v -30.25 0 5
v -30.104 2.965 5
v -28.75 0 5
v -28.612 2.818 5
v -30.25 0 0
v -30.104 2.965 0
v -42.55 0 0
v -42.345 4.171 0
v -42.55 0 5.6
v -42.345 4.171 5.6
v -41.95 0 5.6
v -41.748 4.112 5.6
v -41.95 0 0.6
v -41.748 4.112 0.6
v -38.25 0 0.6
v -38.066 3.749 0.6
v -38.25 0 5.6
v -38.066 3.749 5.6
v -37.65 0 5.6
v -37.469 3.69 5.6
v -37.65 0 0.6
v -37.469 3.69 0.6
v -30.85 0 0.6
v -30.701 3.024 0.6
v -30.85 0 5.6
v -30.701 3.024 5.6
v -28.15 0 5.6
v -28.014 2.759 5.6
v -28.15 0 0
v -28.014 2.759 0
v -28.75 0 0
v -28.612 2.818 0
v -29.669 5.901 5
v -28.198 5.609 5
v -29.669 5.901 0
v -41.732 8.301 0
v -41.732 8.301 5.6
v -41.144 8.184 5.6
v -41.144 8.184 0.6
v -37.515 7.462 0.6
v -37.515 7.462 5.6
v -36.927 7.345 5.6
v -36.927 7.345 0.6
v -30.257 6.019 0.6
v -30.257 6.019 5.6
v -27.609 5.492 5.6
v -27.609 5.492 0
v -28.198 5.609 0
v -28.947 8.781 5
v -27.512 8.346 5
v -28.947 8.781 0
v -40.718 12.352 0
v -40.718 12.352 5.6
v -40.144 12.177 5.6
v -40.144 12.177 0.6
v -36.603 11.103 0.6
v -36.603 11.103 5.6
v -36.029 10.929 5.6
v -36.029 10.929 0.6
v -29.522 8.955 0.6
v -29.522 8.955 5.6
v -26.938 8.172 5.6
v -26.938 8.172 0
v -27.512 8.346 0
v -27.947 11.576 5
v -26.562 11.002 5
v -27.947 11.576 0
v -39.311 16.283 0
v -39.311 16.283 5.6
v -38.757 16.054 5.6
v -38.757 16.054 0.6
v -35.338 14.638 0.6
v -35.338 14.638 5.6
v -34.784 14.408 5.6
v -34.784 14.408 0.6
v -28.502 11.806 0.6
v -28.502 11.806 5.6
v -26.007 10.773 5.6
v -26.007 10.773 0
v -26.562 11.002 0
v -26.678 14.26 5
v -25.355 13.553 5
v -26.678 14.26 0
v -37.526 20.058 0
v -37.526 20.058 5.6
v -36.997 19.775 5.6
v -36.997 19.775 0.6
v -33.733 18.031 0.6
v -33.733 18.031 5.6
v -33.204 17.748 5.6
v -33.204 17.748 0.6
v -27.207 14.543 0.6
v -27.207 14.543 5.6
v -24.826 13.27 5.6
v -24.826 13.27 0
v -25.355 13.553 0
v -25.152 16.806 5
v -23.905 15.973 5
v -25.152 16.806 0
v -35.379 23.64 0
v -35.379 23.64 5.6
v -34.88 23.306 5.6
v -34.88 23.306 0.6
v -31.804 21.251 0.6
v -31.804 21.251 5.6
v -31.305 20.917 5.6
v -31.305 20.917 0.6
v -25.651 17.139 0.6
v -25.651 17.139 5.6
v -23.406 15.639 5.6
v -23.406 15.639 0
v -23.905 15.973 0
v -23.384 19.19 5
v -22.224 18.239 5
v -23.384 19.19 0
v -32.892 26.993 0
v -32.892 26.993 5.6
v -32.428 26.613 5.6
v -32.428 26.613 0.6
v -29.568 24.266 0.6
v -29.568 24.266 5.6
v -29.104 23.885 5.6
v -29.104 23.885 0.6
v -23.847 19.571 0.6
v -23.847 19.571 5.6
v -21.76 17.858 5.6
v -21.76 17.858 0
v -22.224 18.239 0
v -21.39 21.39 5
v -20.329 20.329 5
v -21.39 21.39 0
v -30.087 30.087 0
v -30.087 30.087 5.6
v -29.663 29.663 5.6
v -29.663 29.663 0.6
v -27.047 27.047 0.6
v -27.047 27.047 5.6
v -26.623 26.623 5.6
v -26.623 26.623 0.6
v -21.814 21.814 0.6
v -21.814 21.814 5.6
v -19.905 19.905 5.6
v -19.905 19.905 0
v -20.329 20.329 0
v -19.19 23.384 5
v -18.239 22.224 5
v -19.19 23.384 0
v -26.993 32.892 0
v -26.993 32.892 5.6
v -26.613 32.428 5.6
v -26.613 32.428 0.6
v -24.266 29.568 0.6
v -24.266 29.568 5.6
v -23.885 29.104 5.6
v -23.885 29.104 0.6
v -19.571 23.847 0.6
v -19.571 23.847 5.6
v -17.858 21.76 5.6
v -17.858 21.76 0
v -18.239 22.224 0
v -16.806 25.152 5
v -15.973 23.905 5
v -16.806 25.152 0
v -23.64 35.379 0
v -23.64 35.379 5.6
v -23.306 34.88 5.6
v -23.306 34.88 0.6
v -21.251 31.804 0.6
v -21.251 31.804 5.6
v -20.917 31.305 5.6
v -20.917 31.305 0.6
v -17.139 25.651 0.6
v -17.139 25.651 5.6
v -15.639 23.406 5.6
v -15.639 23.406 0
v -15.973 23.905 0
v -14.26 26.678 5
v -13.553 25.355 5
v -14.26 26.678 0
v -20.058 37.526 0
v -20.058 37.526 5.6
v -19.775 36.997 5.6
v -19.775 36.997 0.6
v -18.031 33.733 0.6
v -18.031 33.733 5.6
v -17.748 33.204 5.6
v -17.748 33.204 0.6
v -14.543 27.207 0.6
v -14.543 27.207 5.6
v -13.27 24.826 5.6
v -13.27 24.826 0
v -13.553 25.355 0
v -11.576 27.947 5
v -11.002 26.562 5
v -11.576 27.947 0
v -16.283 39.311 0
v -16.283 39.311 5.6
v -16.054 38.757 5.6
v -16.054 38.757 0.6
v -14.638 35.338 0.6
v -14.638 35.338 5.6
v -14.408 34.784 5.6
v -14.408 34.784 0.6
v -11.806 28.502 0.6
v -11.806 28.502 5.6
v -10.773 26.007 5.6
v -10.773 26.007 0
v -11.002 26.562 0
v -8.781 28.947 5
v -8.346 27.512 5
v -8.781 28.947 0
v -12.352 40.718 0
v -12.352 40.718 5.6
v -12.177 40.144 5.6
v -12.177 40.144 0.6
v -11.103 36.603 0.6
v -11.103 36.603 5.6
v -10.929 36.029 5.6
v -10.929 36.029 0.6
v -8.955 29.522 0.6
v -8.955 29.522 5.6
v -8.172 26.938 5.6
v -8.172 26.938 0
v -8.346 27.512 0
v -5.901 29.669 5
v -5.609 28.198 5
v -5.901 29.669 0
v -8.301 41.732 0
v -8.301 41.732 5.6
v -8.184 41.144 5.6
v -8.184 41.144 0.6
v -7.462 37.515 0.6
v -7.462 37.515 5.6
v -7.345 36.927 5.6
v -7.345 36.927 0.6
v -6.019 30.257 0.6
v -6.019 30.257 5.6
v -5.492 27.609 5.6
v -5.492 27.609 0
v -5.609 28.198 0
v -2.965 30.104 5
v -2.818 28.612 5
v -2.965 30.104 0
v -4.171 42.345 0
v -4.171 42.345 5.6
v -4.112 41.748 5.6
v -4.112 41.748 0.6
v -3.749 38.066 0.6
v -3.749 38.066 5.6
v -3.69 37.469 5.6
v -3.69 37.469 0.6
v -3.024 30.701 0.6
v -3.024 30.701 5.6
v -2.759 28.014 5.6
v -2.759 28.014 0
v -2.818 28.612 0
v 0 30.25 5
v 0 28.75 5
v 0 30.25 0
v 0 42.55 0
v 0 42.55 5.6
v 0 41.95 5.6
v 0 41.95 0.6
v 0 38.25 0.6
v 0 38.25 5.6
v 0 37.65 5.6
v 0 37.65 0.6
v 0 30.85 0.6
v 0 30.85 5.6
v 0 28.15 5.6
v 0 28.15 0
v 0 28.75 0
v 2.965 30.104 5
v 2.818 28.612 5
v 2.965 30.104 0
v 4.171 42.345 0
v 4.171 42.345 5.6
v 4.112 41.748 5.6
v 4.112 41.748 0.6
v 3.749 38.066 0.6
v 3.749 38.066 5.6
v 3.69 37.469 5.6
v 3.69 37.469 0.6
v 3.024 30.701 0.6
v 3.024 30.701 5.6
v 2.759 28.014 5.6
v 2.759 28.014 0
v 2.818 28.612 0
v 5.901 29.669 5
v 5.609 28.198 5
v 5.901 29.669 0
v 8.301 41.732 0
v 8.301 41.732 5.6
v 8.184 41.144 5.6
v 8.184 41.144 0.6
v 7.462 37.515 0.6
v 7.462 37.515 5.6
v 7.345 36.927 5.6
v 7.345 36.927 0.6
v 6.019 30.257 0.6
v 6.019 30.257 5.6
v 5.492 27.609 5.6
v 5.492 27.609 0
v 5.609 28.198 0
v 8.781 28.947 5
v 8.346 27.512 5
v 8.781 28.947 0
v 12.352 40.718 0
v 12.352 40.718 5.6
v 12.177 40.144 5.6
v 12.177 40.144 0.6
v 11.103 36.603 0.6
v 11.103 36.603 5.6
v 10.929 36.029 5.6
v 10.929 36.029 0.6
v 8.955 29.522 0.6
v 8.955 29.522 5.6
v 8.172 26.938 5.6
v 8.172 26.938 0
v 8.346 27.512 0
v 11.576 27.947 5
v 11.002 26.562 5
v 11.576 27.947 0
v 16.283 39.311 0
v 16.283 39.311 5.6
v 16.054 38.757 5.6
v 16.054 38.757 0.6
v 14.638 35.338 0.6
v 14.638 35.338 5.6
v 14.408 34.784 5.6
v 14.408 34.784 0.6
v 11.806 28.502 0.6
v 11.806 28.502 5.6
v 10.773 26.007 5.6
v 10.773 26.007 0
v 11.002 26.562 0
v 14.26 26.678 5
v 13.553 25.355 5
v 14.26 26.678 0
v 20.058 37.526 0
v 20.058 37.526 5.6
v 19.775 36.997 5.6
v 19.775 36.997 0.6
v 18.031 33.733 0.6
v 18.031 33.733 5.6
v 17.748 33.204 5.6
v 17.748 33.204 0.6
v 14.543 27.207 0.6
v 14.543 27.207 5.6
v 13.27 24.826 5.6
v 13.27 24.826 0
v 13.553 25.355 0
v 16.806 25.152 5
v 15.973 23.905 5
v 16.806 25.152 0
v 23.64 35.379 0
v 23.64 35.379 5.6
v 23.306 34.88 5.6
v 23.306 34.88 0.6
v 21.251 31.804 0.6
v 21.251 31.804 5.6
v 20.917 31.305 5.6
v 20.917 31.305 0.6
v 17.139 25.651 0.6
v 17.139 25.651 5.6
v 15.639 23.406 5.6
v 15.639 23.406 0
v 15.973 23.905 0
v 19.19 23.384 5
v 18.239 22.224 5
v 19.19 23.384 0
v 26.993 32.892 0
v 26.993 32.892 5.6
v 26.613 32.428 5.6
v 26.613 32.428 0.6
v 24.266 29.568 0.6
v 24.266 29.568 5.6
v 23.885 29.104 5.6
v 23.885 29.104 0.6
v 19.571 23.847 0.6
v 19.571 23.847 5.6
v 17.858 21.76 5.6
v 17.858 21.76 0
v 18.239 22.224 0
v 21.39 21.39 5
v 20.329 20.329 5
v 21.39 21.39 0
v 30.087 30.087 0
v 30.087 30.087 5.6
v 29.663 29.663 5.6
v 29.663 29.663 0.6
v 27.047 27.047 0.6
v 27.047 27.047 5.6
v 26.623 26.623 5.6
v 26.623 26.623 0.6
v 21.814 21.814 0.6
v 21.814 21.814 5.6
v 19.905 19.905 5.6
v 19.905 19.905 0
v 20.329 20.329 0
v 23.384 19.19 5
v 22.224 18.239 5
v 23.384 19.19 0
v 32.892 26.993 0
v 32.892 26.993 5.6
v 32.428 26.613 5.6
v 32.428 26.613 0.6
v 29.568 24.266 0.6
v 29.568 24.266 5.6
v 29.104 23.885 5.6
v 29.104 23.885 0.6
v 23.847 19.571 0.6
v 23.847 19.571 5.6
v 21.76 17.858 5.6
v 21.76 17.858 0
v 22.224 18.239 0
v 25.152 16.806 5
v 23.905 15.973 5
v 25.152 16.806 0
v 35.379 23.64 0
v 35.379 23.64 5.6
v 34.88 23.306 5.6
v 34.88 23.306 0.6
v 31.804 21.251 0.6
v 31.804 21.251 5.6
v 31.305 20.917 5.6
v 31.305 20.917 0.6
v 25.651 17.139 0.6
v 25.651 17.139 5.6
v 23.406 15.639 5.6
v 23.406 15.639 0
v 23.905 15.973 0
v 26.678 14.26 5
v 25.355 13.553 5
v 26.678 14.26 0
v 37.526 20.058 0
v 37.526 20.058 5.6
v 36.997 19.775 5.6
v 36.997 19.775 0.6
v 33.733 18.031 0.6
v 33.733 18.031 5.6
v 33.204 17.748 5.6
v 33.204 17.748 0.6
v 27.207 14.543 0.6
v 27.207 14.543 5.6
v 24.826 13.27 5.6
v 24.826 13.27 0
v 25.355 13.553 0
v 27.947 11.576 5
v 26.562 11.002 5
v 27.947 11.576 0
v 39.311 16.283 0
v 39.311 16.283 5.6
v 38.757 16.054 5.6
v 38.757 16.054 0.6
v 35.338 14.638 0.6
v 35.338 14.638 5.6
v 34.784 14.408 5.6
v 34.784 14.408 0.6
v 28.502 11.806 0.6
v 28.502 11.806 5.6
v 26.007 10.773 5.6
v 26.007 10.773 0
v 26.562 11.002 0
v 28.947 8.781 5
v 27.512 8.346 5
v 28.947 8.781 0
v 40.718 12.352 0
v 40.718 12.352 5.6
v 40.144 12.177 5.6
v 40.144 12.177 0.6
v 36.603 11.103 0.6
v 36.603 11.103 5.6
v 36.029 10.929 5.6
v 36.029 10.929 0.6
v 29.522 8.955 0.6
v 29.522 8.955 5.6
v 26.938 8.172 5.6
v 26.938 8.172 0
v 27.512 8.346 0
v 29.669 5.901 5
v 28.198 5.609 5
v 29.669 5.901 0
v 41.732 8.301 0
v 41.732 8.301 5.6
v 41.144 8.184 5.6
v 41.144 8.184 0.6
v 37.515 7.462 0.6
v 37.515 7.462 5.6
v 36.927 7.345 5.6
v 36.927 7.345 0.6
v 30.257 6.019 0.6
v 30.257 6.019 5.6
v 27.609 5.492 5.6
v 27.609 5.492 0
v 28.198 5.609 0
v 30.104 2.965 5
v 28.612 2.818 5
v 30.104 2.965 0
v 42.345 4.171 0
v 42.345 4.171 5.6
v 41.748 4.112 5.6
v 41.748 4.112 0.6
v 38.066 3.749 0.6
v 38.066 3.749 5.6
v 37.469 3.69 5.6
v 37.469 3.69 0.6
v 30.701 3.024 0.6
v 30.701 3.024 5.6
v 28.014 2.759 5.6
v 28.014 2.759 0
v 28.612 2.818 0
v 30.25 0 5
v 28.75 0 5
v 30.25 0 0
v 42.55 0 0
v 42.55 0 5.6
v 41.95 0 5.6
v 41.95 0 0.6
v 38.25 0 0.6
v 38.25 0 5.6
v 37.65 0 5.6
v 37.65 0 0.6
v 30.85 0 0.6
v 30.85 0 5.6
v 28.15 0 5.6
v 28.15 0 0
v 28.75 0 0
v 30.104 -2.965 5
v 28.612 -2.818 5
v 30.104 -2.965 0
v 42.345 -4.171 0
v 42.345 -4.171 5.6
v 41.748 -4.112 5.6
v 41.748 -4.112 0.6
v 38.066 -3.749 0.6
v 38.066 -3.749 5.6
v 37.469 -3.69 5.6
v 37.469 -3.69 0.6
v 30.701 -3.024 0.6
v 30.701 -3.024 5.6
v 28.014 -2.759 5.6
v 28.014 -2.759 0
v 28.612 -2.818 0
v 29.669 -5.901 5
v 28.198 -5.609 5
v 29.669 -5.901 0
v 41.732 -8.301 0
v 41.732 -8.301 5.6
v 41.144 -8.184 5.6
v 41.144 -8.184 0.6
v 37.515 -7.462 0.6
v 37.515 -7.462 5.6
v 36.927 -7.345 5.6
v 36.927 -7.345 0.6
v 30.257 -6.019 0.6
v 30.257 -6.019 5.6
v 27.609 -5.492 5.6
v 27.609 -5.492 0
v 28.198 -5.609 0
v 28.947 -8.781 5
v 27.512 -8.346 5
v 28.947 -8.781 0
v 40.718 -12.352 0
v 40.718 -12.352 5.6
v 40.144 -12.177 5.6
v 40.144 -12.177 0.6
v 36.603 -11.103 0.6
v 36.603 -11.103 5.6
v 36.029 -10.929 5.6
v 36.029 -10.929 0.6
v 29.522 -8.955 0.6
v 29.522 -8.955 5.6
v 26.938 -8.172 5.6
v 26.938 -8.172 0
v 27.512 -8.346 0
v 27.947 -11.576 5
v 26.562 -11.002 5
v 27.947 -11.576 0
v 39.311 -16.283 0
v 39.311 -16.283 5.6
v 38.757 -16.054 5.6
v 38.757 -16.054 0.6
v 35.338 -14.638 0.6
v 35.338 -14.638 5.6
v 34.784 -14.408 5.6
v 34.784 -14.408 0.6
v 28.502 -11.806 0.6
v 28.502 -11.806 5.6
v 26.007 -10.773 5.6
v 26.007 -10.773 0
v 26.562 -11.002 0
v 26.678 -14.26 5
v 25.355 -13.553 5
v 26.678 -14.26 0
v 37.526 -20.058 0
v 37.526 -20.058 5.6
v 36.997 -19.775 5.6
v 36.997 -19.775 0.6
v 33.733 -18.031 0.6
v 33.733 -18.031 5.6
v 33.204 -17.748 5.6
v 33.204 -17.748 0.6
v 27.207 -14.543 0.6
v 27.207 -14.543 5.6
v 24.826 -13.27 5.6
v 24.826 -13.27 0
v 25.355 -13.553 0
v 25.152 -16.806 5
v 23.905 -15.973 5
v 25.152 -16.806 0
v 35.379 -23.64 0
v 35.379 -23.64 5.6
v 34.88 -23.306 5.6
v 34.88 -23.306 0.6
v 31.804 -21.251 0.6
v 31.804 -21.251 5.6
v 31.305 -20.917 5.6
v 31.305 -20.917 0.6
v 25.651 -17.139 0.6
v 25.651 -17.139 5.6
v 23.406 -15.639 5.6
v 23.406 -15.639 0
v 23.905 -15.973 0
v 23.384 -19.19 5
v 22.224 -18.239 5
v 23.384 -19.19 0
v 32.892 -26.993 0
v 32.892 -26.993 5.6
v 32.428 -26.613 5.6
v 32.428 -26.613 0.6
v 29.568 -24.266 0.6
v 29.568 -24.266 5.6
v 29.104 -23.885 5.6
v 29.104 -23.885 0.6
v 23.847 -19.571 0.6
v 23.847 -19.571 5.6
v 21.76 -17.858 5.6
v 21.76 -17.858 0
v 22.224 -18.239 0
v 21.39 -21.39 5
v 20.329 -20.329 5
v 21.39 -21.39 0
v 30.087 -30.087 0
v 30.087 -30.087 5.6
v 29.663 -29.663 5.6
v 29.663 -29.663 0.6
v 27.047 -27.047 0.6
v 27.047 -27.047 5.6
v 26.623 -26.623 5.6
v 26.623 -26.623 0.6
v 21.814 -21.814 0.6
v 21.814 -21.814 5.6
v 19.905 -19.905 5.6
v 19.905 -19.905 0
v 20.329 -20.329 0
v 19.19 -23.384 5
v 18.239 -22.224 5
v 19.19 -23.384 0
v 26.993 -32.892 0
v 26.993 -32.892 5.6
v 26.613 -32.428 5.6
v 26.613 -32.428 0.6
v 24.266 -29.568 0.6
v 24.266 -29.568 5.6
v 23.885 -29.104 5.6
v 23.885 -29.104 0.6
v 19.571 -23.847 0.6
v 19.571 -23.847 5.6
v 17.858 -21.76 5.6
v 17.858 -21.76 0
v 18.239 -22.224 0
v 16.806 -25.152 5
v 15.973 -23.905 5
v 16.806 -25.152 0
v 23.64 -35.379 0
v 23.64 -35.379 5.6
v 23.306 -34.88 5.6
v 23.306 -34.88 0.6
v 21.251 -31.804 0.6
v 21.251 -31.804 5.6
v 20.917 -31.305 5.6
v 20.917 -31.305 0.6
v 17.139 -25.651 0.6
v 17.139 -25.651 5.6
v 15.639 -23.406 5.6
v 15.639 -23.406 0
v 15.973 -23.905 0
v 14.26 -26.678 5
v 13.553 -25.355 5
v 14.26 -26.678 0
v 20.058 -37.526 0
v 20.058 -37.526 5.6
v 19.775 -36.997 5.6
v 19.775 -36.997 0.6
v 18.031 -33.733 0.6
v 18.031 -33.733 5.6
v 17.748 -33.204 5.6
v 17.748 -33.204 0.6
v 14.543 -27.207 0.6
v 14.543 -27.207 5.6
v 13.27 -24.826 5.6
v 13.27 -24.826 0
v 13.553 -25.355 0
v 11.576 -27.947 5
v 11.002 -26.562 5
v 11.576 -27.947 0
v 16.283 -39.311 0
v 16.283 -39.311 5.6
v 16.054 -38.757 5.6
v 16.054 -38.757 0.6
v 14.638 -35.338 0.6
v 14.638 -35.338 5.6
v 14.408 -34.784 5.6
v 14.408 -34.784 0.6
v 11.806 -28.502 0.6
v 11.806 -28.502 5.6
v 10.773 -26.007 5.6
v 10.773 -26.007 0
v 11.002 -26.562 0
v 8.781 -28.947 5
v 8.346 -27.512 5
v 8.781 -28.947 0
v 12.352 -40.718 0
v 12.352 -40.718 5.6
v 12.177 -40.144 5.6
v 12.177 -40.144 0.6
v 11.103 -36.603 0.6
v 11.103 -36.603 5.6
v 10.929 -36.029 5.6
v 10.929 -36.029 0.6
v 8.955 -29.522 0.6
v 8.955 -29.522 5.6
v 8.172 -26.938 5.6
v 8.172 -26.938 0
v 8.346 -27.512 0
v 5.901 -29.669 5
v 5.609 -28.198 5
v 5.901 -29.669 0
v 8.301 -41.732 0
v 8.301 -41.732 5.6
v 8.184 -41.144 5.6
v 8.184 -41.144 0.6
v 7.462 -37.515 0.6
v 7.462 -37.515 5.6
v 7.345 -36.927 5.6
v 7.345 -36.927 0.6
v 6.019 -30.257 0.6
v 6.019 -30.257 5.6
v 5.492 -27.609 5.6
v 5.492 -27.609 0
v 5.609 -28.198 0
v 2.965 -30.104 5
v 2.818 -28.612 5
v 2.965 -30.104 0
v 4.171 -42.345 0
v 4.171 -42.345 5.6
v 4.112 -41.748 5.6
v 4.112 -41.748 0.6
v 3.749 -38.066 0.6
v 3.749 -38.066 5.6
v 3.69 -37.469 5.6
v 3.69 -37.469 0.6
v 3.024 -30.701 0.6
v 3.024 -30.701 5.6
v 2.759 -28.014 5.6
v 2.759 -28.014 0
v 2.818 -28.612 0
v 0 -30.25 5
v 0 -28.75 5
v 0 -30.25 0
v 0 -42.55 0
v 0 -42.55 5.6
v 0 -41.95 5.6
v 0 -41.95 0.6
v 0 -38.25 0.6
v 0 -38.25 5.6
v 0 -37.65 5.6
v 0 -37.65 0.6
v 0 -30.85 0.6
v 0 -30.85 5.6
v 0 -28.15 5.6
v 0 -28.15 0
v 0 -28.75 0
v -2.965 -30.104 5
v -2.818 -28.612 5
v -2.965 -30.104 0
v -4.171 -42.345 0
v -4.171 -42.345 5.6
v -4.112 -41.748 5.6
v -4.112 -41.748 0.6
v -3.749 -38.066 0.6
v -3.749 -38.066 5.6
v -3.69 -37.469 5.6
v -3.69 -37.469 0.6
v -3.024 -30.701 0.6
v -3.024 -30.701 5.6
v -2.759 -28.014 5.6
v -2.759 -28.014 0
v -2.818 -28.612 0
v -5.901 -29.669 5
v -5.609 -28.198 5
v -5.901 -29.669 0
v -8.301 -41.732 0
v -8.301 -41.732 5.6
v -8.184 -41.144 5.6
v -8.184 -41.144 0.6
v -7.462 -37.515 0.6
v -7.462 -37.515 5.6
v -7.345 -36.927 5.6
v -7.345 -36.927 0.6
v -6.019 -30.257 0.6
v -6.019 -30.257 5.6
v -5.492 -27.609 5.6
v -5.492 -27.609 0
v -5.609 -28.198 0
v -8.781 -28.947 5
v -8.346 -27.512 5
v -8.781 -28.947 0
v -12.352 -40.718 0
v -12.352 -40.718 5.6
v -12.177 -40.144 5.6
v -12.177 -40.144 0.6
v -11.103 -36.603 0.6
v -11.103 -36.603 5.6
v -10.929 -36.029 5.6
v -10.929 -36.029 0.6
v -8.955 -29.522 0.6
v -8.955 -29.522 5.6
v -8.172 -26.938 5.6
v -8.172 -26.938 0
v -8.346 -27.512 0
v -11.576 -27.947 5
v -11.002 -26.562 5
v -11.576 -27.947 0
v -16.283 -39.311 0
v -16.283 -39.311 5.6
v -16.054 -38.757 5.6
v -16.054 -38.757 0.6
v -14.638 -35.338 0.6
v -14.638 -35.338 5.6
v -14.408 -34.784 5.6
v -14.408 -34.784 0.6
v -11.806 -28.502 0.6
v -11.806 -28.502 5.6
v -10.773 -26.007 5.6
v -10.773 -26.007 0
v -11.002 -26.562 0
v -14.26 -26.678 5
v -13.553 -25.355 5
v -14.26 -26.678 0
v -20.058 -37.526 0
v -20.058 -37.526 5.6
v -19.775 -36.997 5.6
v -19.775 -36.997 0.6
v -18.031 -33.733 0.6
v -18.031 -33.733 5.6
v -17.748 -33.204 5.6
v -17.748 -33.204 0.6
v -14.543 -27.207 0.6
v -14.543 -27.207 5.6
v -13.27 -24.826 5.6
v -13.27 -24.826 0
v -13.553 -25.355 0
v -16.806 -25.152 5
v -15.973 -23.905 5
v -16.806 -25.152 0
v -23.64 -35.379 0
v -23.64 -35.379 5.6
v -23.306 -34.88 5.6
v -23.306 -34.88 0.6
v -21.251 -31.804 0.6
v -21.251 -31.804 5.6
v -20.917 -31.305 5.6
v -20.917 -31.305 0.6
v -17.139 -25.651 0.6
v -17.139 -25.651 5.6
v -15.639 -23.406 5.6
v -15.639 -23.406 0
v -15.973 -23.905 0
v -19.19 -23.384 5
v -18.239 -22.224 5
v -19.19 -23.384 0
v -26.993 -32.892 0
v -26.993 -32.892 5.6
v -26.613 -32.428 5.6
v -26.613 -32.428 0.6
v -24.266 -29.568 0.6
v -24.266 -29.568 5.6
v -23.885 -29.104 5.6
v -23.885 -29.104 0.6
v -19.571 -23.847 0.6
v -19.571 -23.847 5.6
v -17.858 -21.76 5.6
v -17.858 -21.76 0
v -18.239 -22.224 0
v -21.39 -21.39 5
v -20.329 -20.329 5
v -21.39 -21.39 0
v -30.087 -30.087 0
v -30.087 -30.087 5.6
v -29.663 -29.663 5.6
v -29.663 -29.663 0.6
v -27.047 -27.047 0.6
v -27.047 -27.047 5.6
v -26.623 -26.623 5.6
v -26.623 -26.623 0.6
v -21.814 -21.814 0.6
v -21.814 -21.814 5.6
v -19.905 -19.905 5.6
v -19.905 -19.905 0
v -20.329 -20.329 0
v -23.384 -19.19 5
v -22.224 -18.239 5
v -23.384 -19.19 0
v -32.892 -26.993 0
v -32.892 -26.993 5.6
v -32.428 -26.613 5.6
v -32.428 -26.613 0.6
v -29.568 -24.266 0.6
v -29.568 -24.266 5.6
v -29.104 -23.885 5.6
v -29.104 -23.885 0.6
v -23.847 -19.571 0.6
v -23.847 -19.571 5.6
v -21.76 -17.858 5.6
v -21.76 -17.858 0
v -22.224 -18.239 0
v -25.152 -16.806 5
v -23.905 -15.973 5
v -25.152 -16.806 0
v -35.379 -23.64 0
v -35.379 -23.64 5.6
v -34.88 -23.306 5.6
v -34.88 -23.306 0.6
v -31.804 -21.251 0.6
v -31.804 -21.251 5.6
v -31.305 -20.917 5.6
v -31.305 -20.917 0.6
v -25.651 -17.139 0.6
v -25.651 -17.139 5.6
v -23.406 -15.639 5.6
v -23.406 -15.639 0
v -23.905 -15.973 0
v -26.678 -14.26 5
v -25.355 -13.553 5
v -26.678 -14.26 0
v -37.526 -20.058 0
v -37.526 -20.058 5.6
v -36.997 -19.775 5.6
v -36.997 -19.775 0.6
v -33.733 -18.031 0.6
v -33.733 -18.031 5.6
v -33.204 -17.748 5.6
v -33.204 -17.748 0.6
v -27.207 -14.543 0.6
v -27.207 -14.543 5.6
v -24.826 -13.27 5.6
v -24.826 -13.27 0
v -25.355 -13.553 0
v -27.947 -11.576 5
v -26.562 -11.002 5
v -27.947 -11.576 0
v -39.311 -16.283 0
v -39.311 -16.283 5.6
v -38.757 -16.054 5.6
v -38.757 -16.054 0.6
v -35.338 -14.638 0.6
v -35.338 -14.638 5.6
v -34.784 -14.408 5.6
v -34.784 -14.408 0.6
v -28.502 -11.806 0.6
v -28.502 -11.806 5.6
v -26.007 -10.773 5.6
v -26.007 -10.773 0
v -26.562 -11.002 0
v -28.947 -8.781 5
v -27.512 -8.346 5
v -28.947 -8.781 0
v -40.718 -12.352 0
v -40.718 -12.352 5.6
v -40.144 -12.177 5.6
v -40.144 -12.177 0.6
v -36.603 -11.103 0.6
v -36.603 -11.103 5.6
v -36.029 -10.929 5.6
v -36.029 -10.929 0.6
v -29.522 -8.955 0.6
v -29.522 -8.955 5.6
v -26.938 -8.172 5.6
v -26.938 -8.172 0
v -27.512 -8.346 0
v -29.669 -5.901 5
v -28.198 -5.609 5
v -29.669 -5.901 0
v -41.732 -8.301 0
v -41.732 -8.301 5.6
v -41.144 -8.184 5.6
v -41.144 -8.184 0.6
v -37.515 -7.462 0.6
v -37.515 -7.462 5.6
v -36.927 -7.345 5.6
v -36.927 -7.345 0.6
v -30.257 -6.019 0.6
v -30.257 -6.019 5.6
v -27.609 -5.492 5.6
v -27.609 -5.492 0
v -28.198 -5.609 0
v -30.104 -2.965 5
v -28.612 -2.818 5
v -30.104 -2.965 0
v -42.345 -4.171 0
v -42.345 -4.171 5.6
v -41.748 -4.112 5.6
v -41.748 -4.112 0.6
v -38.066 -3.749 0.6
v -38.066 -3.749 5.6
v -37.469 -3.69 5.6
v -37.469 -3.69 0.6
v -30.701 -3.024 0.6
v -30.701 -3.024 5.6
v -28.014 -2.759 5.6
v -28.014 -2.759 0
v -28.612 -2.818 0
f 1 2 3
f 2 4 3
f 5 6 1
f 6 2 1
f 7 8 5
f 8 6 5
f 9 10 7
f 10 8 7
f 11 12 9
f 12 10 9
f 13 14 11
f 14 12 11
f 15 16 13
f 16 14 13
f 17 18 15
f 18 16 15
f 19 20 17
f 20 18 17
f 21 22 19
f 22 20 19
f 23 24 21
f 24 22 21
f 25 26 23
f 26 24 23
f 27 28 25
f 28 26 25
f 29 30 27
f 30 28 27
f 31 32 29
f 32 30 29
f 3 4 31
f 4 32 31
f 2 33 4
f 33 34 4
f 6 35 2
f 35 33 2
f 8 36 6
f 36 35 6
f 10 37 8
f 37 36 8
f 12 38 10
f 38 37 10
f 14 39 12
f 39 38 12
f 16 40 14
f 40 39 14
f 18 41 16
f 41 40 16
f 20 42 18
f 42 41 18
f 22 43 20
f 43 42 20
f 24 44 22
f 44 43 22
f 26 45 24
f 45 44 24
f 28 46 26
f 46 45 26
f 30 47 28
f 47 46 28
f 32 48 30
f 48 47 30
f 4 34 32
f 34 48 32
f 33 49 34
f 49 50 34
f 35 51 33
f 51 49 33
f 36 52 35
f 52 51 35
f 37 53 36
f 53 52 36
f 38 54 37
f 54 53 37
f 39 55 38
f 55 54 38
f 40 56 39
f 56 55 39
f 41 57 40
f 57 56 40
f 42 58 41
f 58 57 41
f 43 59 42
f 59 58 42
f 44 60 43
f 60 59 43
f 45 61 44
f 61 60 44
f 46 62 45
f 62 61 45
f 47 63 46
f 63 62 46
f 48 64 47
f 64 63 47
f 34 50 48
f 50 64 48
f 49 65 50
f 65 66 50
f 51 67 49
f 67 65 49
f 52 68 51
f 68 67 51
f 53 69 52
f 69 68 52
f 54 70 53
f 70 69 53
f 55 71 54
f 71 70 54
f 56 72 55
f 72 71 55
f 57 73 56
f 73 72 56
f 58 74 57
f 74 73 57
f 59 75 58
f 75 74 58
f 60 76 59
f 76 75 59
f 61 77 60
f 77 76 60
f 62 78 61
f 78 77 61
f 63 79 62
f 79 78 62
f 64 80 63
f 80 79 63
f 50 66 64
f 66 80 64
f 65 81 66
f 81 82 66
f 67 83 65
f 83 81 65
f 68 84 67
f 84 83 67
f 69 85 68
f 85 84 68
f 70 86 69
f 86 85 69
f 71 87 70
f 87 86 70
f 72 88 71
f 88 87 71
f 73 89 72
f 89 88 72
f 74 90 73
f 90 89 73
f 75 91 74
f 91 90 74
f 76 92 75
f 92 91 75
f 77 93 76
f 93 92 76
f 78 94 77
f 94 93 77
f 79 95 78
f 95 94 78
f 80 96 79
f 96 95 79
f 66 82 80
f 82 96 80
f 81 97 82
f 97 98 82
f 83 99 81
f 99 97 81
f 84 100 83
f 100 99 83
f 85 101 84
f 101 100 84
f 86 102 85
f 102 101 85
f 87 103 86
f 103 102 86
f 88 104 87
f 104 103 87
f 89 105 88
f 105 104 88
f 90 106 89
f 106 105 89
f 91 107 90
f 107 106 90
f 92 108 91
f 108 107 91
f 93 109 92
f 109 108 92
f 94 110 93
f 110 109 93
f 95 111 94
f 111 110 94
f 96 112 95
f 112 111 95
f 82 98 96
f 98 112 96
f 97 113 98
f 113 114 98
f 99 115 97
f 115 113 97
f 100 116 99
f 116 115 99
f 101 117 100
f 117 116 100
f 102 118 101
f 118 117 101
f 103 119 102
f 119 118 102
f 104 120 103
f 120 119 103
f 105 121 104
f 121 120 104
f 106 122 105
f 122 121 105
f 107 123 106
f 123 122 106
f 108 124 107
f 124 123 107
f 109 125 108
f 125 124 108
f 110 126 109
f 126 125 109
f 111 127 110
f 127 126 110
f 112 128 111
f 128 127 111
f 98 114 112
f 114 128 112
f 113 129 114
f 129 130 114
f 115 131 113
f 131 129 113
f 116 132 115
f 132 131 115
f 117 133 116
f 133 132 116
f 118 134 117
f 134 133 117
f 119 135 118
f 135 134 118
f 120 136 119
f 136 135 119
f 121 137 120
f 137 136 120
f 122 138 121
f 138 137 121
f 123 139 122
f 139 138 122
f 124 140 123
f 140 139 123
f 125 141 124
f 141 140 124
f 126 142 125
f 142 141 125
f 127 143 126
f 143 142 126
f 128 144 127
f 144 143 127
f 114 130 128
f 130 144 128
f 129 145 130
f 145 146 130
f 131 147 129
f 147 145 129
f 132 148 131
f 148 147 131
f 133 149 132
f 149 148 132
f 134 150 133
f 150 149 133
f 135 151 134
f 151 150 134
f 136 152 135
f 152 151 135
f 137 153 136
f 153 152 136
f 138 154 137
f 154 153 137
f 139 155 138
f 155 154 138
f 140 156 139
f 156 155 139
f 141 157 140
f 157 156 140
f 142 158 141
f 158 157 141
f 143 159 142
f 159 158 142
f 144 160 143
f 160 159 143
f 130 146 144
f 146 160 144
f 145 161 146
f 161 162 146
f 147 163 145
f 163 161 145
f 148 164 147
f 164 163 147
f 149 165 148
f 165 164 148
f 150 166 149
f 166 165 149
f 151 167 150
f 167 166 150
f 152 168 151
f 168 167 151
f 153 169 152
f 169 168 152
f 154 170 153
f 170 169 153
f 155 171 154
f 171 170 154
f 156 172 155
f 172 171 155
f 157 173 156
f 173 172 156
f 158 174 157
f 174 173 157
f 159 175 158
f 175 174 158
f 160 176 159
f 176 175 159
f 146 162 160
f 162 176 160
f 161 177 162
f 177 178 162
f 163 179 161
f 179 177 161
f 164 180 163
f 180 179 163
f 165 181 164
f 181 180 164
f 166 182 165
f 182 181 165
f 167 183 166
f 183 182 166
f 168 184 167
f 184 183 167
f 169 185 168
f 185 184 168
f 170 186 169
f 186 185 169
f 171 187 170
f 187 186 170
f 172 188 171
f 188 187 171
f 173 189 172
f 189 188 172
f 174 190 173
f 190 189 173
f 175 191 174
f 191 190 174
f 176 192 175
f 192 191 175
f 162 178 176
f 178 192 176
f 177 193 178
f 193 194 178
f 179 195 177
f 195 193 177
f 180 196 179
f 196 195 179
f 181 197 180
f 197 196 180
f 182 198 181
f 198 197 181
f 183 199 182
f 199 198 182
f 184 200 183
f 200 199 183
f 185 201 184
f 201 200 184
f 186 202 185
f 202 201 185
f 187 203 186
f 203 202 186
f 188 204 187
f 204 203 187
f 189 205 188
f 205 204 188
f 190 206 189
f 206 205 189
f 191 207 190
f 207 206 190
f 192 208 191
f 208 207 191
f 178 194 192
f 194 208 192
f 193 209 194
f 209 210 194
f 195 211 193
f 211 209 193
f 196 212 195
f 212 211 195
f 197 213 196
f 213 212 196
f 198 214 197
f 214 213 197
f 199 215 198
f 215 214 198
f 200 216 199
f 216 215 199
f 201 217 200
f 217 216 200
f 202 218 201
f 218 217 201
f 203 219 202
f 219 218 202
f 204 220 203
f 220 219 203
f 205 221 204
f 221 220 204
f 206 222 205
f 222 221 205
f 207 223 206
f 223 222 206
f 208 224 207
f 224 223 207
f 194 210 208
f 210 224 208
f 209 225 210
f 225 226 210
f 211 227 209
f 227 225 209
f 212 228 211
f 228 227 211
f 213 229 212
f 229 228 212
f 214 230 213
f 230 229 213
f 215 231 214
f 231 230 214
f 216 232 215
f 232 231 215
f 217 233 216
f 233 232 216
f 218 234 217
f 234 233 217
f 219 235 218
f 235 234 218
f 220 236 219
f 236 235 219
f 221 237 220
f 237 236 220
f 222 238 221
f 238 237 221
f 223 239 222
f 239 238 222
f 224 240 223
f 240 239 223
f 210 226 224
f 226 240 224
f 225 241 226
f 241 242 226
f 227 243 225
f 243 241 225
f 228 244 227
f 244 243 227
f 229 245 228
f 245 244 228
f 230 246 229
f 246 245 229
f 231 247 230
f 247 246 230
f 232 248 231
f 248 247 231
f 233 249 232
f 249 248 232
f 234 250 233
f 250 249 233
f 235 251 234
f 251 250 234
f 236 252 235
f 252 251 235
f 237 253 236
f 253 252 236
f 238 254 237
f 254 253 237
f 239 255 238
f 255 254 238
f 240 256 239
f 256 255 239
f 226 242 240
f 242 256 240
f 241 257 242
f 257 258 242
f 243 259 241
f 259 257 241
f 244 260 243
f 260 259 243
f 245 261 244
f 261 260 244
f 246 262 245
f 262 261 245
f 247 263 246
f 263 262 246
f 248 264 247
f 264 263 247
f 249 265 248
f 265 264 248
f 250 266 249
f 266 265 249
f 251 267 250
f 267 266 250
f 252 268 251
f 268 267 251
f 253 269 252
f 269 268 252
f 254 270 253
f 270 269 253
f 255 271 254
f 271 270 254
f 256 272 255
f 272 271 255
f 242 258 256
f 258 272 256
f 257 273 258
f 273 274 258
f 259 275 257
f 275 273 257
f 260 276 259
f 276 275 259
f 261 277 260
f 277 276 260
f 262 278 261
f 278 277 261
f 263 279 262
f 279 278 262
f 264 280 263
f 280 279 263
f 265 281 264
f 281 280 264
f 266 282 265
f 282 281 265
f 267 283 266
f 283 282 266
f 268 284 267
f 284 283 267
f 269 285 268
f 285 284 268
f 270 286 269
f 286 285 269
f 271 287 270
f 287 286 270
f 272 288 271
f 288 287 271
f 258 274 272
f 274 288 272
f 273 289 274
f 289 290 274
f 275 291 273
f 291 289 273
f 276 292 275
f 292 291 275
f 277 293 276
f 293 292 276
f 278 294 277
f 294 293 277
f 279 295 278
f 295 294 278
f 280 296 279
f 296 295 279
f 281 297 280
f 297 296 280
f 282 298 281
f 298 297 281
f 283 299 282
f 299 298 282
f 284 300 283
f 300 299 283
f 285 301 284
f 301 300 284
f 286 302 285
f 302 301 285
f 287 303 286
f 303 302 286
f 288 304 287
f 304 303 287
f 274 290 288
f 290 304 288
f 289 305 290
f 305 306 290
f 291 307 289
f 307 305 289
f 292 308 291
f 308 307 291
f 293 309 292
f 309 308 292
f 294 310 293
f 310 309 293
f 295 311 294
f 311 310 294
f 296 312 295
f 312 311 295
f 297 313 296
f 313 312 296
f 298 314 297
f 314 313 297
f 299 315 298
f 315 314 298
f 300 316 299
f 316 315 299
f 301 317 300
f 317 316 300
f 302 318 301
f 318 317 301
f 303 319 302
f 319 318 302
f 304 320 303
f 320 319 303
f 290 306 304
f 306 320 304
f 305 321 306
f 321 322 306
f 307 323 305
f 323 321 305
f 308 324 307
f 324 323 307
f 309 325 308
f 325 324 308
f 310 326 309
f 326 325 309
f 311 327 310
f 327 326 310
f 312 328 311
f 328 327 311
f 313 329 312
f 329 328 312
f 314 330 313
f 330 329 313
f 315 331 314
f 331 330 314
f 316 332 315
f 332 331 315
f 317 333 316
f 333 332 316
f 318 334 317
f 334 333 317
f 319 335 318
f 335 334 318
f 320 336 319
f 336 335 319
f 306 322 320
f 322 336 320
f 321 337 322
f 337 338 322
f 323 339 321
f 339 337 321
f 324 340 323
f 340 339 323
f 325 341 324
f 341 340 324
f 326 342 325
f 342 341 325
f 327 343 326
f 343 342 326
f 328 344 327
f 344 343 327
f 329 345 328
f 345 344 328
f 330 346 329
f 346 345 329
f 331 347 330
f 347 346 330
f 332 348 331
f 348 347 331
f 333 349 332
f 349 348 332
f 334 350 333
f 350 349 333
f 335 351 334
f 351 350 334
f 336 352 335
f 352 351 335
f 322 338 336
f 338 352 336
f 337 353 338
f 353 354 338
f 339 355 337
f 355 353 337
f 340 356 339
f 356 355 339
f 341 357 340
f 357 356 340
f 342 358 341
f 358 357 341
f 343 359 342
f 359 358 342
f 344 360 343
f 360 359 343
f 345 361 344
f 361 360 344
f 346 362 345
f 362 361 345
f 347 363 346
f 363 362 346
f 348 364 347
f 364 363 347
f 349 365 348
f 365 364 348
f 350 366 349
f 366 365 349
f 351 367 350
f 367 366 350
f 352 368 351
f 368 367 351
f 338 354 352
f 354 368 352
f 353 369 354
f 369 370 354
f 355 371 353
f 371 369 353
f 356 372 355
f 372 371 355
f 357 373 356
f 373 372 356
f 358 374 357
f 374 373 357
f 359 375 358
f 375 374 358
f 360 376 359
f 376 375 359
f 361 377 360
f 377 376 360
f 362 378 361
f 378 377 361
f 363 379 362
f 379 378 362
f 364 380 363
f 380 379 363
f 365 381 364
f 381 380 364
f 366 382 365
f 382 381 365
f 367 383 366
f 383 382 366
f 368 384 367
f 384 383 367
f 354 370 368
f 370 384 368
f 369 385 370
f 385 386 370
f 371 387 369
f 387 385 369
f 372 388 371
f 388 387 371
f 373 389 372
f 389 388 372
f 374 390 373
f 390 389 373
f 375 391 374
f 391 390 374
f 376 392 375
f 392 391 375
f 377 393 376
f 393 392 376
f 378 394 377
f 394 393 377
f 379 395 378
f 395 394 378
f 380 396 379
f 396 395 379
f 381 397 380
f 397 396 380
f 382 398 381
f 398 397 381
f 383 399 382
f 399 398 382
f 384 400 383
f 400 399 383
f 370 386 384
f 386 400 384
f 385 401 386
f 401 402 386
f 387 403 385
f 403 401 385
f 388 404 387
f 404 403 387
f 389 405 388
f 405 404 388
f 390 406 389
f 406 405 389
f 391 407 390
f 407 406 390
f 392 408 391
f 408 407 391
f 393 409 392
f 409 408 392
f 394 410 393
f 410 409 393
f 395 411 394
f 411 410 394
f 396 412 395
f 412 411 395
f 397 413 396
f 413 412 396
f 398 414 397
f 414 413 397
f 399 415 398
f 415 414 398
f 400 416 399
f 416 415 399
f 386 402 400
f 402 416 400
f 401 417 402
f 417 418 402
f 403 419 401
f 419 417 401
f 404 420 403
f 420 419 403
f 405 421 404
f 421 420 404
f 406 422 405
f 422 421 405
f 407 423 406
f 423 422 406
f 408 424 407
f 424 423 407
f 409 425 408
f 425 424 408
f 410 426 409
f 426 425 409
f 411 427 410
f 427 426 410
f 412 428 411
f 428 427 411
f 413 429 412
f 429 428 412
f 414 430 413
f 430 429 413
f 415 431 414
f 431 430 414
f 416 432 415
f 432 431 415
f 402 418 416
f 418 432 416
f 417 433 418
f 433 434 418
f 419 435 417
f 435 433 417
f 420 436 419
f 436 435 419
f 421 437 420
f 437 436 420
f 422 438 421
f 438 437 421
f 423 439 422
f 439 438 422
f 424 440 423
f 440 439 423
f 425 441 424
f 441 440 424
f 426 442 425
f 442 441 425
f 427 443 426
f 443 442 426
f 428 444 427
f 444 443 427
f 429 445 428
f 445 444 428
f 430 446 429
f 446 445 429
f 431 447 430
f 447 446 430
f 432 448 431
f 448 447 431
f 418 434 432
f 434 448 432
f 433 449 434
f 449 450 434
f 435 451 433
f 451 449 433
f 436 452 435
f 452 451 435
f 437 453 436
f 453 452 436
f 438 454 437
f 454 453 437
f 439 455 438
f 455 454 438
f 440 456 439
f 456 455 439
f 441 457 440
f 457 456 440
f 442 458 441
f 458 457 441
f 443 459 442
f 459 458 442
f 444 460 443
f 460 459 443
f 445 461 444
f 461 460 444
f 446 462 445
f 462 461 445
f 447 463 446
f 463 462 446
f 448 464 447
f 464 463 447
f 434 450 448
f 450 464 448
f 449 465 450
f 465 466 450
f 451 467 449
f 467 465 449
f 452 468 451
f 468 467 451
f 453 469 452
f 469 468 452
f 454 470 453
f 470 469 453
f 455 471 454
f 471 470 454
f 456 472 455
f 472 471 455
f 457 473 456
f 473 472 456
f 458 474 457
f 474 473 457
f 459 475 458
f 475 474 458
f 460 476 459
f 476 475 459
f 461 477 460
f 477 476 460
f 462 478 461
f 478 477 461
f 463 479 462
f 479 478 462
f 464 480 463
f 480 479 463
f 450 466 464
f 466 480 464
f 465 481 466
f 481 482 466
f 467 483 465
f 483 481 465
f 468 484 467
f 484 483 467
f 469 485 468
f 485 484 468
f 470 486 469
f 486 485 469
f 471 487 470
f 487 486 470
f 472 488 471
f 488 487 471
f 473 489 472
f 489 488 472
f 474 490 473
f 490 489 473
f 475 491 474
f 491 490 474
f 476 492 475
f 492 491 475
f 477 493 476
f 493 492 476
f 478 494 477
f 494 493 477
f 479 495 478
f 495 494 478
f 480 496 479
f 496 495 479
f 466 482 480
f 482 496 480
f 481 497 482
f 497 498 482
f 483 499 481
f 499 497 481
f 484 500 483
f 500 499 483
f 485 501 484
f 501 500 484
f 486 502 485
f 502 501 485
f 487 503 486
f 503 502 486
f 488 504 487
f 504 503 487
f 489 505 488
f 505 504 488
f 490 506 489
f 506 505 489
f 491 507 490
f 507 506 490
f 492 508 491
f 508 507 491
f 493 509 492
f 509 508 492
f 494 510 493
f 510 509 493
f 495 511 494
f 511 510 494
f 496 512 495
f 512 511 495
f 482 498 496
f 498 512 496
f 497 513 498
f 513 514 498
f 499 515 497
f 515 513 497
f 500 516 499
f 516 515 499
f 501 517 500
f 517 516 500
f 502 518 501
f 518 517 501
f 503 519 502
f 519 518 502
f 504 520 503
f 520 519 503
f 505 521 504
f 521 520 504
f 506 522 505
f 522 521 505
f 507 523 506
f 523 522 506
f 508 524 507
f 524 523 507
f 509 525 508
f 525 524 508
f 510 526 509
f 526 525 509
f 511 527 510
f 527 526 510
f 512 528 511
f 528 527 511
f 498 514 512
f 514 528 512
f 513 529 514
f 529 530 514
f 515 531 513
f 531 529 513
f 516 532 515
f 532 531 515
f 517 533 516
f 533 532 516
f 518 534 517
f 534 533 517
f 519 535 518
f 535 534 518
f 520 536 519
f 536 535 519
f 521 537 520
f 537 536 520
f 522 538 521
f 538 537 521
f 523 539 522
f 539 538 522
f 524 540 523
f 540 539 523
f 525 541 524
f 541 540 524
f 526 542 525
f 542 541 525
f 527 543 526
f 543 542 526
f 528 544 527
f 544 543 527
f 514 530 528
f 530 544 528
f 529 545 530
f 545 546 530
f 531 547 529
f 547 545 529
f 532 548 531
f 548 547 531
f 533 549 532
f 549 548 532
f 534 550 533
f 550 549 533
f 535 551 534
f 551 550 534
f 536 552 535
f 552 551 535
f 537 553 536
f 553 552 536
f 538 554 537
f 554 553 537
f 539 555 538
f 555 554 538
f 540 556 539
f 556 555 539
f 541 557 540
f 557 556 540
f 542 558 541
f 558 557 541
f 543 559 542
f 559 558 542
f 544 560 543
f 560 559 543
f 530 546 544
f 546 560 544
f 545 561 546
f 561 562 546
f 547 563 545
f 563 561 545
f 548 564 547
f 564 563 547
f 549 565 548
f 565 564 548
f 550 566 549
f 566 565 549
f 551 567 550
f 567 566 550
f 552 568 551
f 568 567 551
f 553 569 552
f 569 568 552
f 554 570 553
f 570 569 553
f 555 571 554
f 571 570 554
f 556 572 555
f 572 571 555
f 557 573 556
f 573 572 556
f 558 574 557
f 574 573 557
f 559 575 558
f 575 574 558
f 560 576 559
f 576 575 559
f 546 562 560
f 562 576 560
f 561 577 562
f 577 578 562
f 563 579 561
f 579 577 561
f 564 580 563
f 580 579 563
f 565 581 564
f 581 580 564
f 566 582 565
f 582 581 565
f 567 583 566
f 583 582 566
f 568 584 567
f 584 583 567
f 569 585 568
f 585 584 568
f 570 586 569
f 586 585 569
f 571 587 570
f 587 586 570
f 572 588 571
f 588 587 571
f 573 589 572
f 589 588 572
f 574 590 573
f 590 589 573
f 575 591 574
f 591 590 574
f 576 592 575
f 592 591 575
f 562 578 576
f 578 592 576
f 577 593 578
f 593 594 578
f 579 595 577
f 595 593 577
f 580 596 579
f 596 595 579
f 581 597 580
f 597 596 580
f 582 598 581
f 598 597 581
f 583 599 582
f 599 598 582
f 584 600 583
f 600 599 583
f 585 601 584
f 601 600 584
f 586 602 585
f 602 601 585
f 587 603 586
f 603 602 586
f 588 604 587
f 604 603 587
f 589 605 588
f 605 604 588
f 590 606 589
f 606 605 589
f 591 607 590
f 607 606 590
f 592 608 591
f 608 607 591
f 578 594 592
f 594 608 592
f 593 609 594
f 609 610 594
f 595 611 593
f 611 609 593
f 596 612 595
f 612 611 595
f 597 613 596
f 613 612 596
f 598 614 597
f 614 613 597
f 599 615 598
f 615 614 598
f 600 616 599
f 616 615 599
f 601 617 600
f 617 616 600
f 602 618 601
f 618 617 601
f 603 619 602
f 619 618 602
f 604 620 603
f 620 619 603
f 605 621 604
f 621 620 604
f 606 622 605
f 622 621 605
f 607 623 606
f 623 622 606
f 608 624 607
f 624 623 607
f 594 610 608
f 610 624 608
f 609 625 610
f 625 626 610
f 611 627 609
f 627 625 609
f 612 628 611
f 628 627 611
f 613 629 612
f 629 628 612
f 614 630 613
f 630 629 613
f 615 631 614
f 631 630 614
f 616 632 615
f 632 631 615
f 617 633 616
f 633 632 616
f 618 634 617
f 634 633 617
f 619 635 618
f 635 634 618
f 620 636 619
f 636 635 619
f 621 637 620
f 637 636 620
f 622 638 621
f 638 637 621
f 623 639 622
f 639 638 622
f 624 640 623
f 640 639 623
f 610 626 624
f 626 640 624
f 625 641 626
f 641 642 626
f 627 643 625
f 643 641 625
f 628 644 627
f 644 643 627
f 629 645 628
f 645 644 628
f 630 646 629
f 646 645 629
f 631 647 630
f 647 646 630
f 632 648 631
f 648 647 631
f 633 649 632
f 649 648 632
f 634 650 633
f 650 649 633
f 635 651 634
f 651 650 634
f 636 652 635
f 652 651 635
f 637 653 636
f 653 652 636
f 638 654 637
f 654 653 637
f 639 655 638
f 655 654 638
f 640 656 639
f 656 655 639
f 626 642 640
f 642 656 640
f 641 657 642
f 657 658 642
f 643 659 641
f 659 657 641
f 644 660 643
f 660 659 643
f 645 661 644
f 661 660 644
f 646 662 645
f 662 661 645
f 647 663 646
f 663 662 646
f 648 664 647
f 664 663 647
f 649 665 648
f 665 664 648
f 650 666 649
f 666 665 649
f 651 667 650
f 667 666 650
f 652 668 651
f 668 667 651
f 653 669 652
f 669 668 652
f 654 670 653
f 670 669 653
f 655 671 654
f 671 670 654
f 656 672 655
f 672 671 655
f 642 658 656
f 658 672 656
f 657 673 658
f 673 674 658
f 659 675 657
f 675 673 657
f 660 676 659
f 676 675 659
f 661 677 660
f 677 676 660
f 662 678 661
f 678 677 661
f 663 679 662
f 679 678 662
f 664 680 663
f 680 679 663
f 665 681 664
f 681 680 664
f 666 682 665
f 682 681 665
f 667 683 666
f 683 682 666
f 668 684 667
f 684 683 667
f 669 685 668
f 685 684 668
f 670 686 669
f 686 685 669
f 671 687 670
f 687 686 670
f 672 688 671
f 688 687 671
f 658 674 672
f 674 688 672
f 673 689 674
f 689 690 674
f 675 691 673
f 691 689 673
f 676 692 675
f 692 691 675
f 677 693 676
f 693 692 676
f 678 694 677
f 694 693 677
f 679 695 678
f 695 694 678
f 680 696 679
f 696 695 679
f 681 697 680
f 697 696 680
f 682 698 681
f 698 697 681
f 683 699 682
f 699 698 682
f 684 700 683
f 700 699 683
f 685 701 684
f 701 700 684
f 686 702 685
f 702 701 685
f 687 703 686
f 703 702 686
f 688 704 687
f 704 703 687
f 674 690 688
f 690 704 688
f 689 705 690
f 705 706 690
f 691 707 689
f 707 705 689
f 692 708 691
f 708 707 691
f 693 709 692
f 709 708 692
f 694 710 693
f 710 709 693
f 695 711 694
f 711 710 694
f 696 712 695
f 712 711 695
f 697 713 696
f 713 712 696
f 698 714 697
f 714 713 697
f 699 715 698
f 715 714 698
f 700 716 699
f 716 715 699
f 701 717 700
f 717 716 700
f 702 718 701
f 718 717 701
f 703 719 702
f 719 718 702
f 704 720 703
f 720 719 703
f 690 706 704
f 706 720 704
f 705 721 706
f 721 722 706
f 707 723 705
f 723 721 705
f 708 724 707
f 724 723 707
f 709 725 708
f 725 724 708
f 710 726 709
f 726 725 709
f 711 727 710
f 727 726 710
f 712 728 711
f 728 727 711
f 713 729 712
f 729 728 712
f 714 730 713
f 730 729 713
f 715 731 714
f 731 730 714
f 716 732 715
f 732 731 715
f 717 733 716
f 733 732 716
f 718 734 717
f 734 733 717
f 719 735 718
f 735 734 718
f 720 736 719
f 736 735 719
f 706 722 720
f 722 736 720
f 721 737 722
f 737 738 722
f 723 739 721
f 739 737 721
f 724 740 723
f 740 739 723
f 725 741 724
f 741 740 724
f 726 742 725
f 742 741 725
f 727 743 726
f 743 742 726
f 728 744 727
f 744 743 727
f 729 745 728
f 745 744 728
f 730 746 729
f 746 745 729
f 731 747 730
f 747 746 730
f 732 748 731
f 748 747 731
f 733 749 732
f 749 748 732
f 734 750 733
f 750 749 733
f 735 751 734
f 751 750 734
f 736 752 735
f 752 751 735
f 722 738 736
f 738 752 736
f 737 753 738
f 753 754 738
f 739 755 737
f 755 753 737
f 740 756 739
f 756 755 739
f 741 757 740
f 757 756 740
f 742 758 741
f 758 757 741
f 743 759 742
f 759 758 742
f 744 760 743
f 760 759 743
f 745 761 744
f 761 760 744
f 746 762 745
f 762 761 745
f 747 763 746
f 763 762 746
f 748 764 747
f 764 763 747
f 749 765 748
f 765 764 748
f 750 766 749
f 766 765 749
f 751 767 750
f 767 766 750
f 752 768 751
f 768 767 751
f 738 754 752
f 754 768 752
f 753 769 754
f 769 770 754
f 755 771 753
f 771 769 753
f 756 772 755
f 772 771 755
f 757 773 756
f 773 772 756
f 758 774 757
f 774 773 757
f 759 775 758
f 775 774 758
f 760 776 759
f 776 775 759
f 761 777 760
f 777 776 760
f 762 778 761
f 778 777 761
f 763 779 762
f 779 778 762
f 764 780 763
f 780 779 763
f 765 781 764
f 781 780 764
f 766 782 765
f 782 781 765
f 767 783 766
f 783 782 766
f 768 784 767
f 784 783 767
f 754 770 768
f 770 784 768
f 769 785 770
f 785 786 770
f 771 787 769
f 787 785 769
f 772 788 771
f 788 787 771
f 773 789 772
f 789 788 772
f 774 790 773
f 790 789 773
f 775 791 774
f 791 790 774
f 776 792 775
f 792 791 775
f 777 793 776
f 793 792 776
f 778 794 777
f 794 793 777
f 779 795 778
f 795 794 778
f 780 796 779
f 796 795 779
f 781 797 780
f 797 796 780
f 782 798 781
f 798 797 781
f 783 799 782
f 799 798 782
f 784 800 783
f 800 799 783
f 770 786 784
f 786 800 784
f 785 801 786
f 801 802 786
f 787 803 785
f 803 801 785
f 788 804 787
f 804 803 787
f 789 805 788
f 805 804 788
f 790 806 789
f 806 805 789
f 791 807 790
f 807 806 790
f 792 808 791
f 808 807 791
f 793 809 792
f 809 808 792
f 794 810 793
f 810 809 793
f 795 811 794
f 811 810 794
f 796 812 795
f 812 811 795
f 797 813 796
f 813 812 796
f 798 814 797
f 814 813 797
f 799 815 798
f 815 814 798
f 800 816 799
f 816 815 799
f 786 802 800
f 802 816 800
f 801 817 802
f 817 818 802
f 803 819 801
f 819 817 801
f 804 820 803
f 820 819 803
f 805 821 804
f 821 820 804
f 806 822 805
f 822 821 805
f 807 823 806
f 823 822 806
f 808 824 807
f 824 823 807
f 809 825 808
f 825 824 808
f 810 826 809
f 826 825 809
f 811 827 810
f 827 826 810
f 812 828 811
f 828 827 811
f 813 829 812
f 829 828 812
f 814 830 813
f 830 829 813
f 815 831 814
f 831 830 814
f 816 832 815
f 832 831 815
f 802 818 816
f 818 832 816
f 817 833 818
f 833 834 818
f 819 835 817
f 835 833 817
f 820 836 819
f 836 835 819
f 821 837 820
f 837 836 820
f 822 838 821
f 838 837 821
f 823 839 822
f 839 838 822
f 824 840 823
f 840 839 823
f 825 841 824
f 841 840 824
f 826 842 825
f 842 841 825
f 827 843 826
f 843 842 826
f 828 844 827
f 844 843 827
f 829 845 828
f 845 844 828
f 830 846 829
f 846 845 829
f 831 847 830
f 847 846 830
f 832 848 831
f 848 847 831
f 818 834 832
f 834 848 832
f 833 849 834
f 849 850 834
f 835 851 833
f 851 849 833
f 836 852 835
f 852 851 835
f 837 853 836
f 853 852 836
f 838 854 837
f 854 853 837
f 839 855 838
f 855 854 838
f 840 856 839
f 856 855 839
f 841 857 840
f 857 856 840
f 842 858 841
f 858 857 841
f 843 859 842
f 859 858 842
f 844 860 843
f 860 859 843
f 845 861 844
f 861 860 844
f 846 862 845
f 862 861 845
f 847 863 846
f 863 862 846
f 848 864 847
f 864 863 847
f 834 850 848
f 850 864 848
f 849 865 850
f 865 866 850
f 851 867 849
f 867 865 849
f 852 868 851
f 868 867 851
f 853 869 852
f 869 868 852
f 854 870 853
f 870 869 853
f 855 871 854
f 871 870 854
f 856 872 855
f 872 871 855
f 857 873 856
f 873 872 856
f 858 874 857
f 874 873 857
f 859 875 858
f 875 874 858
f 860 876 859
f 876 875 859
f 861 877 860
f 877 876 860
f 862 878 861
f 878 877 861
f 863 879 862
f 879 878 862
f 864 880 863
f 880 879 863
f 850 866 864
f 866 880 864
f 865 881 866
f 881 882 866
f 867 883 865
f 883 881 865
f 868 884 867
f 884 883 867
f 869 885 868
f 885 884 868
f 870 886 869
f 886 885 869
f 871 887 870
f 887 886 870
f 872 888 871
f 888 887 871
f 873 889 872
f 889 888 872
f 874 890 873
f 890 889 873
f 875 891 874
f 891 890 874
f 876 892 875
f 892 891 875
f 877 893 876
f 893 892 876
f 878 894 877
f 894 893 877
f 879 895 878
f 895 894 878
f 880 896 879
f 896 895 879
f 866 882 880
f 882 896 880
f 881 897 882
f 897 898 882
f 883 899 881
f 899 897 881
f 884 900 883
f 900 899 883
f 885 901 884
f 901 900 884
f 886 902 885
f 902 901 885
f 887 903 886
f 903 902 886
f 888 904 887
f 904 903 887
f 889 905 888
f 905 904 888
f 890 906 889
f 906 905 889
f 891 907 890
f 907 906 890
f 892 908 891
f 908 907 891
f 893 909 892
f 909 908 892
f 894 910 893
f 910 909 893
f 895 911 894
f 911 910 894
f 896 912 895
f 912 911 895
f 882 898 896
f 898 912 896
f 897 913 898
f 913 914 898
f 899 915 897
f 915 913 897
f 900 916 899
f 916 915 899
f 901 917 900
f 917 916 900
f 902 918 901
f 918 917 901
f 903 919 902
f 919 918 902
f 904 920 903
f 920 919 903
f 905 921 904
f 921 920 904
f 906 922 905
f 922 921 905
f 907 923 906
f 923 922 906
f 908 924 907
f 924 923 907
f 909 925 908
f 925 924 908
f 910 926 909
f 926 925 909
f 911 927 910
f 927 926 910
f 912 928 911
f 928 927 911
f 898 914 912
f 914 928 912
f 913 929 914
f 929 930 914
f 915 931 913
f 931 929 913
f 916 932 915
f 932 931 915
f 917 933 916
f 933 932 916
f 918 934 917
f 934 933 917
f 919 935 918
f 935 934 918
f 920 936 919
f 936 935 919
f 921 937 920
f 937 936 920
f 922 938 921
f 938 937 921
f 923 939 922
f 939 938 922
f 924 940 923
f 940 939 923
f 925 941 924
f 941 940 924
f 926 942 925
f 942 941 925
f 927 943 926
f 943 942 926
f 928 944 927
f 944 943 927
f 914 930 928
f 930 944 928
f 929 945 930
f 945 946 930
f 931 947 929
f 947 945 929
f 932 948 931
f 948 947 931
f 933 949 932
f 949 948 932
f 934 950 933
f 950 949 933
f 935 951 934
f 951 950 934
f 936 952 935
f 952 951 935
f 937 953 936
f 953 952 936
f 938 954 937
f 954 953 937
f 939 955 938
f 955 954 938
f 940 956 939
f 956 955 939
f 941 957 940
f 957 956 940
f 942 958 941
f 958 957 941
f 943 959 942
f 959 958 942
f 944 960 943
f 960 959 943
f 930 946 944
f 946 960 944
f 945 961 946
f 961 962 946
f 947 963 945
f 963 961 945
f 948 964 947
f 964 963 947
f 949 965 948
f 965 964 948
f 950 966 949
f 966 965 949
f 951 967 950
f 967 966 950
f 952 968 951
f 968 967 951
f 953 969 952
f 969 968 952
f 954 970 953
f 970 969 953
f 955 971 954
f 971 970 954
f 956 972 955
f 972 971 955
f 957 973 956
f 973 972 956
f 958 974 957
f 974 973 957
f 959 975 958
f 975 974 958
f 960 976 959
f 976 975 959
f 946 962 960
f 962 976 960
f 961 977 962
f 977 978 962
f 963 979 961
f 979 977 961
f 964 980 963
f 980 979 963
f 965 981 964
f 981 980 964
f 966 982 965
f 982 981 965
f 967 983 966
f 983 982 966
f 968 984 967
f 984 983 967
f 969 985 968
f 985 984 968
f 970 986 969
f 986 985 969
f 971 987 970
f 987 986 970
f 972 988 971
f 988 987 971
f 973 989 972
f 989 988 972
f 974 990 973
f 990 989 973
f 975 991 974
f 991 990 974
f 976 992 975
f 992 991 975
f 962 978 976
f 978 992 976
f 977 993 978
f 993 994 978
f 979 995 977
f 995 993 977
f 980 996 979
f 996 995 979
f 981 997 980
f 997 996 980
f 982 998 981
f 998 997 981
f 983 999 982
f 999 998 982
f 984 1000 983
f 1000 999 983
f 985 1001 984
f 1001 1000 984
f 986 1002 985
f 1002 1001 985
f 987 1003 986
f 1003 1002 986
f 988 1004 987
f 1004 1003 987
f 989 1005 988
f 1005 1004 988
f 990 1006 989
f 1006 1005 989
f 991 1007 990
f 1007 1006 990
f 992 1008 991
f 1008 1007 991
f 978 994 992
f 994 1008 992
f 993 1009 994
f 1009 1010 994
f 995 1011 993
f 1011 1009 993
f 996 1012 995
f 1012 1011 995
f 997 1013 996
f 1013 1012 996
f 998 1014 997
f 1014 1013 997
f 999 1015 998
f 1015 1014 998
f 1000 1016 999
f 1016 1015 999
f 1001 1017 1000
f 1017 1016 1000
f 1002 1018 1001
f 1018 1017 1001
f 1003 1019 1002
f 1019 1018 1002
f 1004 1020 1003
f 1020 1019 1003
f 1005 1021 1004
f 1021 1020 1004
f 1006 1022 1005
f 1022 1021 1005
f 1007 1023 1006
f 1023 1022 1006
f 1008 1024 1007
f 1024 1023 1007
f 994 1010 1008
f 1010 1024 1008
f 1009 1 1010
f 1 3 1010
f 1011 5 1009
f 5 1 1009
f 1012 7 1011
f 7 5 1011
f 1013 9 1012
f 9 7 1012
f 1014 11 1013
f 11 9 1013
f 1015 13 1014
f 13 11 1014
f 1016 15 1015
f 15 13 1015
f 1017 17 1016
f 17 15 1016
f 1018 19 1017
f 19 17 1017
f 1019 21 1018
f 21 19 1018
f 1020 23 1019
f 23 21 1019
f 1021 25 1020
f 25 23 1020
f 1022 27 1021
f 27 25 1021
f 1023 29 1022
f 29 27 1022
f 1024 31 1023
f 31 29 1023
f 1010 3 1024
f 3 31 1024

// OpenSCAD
$fn = $preview? 16: 64;

module cup_joiner() {
  bottom_inner_radius = 57.5 / 2;
  top_inner_radius = 76.5 / 2;
  thickness = 0.6;
  depth = 5;
  inner_slit = 1.5;
  outer_slit = 3.7;

  rotate_extrude()
    polygon([
      [bottom_inner_radius - thickness, 0],
      [bottom_inner_radius, 0],
      [bottom_inner_radius, depth],
      [bottom_inner_radius + inner_slit, depth],
      [bottom_inner_radius + inner_slit, 0],
      [top_inner_radius + outer_slit + thickness, 0],
      [top_inner_radius + outer_slit + thickness, thickness + depth],
      [top_inner_radius + outer_slit, thickness + depth],
      [top_inner_radius + outer_slit, thickness],
      [top_inner_radius, thickness],
      [top_inner_radius, thickness + depth],
      [top_inner_radius - thickness, thickness + depth],
      [top_inner_radius - thickness, thickness],
      [bottom_inner_radius + inner_slit + thickness, thickness],
      [bottom_inner_radius + inner_slit + thickness, thickness + depth],
      [bottom_inner_radius - thickness, thickness + depth],
    ]);
}

cup_joiner();
